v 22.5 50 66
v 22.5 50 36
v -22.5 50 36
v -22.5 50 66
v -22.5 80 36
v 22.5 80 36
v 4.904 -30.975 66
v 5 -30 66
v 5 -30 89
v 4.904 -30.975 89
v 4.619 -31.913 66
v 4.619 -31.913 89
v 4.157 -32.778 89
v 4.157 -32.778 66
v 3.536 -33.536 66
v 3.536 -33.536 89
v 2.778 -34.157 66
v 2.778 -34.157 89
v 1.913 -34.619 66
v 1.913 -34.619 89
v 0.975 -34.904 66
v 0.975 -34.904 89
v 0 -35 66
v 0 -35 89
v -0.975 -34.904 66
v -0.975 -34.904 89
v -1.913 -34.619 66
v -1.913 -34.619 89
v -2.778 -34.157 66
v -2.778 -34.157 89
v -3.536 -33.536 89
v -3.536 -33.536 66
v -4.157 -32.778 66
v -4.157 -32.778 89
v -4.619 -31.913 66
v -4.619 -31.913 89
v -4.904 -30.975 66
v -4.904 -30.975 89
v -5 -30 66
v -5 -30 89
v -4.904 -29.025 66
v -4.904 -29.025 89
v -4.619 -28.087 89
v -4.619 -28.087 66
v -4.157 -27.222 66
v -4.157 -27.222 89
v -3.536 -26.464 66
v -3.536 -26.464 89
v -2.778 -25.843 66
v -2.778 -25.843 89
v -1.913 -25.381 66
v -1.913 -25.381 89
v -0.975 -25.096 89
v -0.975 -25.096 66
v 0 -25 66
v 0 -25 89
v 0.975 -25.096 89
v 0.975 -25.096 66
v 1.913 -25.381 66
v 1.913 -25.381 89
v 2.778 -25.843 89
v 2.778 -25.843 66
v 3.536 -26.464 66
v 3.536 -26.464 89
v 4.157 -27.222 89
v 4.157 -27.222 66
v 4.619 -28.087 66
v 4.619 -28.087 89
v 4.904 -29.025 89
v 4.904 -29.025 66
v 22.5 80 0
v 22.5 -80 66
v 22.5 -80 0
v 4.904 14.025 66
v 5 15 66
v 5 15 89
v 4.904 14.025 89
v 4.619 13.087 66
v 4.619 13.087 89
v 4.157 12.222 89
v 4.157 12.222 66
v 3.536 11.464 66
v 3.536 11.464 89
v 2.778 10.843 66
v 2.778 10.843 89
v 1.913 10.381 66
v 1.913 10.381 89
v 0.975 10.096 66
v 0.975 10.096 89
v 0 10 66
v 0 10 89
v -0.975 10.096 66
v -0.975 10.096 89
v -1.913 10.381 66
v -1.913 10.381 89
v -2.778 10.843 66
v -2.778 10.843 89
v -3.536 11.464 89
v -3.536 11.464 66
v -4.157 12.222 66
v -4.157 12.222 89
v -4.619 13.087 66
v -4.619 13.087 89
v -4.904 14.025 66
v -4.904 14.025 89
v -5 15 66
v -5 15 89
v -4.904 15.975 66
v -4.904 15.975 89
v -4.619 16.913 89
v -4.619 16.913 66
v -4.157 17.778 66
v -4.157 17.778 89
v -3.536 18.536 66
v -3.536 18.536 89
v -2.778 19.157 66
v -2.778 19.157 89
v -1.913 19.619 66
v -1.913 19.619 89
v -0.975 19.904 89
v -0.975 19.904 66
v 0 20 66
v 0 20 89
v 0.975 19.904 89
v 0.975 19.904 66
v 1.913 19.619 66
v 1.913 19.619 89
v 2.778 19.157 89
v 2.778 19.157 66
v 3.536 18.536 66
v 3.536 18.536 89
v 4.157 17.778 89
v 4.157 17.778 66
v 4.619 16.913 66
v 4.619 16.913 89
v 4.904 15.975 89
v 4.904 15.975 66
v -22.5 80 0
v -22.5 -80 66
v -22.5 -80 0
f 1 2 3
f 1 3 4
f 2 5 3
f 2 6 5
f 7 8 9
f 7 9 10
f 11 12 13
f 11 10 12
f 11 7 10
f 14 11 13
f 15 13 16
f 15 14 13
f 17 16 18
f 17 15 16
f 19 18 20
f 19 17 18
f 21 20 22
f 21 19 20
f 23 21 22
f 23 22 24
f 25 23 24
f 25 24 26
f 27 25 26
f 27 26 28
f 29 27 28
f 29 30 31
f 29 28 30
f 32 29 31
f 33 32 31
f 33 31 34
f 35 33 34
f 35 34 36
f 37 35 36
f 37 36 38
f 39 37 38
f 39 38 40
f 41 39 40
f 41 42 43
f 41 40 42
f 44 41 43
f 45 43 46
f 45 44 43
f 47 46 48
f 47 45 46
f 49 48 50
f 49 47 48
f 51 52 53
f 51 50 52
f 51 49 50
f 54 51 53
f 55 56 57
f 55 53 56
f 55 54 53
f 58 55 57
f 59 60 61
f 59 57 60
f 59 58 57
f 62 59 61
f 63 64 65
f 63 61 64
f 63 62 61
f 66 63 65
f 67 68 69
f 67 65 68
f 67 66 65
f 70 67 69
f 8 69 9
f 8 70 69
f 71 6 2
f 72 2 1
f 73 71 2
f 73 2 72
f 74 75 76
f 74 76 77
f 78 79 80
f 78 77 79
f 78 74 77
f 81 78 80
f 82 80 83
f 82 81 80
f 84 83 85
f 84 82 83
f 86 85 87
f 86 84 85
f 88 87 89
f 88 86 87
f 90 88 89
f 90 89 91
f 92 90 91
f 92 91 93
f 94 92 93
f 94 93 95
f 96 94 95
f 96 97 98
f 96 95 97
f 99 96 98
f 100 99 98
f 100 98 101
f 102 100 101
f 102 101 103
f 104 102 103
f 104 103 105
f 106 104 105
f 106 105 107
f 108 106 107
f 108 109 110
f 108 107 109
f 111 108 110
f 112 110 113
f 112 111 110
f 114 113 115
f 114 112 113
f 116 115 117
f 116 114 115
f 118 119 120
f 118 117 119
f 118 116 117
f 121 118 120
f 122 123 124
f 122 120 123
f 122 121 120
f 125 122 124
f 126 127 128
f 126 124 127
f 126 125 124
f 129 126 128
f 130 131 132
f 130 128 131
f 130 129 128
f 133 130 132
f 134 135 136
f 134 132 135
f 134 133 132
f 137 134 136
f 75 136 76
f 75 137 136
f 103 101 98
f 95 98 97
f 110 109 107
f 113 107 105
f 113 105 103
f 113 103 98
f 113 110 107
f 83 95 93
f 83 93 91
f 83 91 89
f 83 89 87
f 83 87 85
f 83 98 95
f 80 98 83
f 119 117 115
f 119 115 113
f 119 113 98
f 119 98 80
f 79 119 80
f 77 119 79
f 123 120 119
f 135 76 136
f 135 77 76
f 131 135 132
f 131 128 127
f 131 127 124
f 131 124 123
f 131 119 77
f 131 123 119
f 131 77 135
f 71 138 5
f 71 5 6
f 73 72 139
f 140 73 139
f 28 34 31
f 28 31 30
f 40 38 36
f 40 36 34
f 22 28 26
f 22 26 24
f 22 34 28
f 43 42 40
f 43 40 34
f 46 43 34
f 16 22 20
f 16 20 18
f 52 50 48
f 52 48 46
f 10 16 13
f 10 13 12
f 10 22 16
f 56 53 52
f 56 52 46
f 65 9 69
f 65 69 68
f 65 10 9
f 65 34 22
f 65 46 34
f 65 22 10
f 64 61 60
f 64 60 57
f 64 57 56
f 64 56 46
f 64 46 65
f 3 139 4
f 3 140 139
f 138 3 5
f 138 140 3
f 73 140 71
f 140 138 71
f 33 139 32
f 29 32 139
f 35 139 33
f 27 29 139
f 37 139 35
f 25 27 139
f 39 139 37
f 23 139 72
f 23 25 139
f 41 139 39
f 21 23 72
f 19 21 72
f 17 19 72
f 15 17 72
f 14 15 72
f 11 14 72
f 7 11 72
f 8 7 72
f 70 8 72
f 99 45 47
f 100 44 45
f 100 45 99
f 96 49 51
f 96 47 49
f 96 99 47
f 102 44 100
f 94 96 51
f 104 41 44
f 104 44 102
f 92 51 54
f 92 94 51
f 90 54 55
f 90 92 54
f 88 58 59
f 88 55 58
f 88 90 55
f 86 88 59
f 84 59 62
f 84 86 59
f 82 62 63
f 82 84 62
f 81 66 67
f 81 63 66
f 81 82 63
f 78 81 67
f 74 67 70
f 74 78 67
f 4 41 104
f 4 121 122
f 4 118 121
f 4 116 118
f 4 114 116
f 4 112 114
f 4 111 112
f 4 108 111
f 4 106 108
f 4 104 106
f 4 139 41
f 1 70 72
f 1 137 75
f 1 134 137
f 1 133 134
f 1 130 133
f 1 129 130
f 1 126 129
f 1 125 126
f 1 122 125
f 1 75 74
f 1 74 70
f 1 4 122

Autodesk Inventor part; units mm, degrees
ref_plane "YZ Plane" through (0, 0, 0) normal (1, 0, 0) x (0, 1, 0)
ref_plane "XZ Plane" through (0, 0, 0) normal (0, 1, 0) x (-1, 0, 0)
ref_plane "XY Plane" through (0, 0, 0) normal (0, 0, 1) x (1, 0, 0)
sketch "Sketch1" plane through (0, 0, 0) normal (0, 0, 1) x (1, 0, 0)
  line L0 (0, 112) -> (0, -112) construction
  line L1 (-31.5, 0) -> (31.5, 0) construction
  line L2 (-22.5, 80) -> (22.5, 80)
  line L3 (22.5, 80) -> (22.5, -80)
  line L4 (22.5, -80) -> (-22.5, -80)
  line L5 (-22.5, -80) -> (-22.5, 80)
  line L6 (-22.5, 80) -> (22.5, -80) construction
  line L7 (22.5, 80) -> (-22.5, -80) construction
  point P0 (0, 0)
  dimension "d4" = 160
  dimension "d5" = 45
extrude "Extrusion3" add sketch "Sketch1" along normal blind 66
sketch "Sketch2" plane through (0, 0, 66) normal (0, 0, 1) x (1, 0, 0)
  circle A0 centre (0, -30) radius 5
  circle A1 centre (0, 15) radius 5
  line L0 (-22.5, -80) -> (22.5, -80) projected
  point P0 (0, 0)
  dimension "d8" = 10
  dimension "d9" = 50
  dimension "d10" = 45
extrude "Extrusion4" add sketch "Sketch2" along normal blind 23
thread "Thread1" size "M10x1.5" class "6g" standard "ISO Metric profile" full length
thread "Thread2" size "M10x1.5" class "6g" standard "ISO Metric profile" full length
sketch "Sketch3" plane through (22.5, -80, 0) normal (1, 0, 0) x (0, 0, -1)
  line L0 (0, 160) -> (0, 0) projected
  line L1 (0, 160) -> (-66, 160) projected
  line L2 (-66, 0) -> (-66, 160) projected
  line L3 (0, 0) -> (-66, 0) projected
  line L4 (-66, 160) -> (-36, 160)
  line L5 (-36, 160) -> (-36, 130)
  line L6 (-36, 130) -> (-66, 130)
  line L7 (-66, 130) -> (-66, 160)
  point P0 (0, 80)
  dimension "d17" = 30
  dimension "d18" = 30
extrude "Extrusion5" cut sketch "Sketch3" against normal through all contours L5 L6 L2 L1
properties part number "17-0028-0082"
